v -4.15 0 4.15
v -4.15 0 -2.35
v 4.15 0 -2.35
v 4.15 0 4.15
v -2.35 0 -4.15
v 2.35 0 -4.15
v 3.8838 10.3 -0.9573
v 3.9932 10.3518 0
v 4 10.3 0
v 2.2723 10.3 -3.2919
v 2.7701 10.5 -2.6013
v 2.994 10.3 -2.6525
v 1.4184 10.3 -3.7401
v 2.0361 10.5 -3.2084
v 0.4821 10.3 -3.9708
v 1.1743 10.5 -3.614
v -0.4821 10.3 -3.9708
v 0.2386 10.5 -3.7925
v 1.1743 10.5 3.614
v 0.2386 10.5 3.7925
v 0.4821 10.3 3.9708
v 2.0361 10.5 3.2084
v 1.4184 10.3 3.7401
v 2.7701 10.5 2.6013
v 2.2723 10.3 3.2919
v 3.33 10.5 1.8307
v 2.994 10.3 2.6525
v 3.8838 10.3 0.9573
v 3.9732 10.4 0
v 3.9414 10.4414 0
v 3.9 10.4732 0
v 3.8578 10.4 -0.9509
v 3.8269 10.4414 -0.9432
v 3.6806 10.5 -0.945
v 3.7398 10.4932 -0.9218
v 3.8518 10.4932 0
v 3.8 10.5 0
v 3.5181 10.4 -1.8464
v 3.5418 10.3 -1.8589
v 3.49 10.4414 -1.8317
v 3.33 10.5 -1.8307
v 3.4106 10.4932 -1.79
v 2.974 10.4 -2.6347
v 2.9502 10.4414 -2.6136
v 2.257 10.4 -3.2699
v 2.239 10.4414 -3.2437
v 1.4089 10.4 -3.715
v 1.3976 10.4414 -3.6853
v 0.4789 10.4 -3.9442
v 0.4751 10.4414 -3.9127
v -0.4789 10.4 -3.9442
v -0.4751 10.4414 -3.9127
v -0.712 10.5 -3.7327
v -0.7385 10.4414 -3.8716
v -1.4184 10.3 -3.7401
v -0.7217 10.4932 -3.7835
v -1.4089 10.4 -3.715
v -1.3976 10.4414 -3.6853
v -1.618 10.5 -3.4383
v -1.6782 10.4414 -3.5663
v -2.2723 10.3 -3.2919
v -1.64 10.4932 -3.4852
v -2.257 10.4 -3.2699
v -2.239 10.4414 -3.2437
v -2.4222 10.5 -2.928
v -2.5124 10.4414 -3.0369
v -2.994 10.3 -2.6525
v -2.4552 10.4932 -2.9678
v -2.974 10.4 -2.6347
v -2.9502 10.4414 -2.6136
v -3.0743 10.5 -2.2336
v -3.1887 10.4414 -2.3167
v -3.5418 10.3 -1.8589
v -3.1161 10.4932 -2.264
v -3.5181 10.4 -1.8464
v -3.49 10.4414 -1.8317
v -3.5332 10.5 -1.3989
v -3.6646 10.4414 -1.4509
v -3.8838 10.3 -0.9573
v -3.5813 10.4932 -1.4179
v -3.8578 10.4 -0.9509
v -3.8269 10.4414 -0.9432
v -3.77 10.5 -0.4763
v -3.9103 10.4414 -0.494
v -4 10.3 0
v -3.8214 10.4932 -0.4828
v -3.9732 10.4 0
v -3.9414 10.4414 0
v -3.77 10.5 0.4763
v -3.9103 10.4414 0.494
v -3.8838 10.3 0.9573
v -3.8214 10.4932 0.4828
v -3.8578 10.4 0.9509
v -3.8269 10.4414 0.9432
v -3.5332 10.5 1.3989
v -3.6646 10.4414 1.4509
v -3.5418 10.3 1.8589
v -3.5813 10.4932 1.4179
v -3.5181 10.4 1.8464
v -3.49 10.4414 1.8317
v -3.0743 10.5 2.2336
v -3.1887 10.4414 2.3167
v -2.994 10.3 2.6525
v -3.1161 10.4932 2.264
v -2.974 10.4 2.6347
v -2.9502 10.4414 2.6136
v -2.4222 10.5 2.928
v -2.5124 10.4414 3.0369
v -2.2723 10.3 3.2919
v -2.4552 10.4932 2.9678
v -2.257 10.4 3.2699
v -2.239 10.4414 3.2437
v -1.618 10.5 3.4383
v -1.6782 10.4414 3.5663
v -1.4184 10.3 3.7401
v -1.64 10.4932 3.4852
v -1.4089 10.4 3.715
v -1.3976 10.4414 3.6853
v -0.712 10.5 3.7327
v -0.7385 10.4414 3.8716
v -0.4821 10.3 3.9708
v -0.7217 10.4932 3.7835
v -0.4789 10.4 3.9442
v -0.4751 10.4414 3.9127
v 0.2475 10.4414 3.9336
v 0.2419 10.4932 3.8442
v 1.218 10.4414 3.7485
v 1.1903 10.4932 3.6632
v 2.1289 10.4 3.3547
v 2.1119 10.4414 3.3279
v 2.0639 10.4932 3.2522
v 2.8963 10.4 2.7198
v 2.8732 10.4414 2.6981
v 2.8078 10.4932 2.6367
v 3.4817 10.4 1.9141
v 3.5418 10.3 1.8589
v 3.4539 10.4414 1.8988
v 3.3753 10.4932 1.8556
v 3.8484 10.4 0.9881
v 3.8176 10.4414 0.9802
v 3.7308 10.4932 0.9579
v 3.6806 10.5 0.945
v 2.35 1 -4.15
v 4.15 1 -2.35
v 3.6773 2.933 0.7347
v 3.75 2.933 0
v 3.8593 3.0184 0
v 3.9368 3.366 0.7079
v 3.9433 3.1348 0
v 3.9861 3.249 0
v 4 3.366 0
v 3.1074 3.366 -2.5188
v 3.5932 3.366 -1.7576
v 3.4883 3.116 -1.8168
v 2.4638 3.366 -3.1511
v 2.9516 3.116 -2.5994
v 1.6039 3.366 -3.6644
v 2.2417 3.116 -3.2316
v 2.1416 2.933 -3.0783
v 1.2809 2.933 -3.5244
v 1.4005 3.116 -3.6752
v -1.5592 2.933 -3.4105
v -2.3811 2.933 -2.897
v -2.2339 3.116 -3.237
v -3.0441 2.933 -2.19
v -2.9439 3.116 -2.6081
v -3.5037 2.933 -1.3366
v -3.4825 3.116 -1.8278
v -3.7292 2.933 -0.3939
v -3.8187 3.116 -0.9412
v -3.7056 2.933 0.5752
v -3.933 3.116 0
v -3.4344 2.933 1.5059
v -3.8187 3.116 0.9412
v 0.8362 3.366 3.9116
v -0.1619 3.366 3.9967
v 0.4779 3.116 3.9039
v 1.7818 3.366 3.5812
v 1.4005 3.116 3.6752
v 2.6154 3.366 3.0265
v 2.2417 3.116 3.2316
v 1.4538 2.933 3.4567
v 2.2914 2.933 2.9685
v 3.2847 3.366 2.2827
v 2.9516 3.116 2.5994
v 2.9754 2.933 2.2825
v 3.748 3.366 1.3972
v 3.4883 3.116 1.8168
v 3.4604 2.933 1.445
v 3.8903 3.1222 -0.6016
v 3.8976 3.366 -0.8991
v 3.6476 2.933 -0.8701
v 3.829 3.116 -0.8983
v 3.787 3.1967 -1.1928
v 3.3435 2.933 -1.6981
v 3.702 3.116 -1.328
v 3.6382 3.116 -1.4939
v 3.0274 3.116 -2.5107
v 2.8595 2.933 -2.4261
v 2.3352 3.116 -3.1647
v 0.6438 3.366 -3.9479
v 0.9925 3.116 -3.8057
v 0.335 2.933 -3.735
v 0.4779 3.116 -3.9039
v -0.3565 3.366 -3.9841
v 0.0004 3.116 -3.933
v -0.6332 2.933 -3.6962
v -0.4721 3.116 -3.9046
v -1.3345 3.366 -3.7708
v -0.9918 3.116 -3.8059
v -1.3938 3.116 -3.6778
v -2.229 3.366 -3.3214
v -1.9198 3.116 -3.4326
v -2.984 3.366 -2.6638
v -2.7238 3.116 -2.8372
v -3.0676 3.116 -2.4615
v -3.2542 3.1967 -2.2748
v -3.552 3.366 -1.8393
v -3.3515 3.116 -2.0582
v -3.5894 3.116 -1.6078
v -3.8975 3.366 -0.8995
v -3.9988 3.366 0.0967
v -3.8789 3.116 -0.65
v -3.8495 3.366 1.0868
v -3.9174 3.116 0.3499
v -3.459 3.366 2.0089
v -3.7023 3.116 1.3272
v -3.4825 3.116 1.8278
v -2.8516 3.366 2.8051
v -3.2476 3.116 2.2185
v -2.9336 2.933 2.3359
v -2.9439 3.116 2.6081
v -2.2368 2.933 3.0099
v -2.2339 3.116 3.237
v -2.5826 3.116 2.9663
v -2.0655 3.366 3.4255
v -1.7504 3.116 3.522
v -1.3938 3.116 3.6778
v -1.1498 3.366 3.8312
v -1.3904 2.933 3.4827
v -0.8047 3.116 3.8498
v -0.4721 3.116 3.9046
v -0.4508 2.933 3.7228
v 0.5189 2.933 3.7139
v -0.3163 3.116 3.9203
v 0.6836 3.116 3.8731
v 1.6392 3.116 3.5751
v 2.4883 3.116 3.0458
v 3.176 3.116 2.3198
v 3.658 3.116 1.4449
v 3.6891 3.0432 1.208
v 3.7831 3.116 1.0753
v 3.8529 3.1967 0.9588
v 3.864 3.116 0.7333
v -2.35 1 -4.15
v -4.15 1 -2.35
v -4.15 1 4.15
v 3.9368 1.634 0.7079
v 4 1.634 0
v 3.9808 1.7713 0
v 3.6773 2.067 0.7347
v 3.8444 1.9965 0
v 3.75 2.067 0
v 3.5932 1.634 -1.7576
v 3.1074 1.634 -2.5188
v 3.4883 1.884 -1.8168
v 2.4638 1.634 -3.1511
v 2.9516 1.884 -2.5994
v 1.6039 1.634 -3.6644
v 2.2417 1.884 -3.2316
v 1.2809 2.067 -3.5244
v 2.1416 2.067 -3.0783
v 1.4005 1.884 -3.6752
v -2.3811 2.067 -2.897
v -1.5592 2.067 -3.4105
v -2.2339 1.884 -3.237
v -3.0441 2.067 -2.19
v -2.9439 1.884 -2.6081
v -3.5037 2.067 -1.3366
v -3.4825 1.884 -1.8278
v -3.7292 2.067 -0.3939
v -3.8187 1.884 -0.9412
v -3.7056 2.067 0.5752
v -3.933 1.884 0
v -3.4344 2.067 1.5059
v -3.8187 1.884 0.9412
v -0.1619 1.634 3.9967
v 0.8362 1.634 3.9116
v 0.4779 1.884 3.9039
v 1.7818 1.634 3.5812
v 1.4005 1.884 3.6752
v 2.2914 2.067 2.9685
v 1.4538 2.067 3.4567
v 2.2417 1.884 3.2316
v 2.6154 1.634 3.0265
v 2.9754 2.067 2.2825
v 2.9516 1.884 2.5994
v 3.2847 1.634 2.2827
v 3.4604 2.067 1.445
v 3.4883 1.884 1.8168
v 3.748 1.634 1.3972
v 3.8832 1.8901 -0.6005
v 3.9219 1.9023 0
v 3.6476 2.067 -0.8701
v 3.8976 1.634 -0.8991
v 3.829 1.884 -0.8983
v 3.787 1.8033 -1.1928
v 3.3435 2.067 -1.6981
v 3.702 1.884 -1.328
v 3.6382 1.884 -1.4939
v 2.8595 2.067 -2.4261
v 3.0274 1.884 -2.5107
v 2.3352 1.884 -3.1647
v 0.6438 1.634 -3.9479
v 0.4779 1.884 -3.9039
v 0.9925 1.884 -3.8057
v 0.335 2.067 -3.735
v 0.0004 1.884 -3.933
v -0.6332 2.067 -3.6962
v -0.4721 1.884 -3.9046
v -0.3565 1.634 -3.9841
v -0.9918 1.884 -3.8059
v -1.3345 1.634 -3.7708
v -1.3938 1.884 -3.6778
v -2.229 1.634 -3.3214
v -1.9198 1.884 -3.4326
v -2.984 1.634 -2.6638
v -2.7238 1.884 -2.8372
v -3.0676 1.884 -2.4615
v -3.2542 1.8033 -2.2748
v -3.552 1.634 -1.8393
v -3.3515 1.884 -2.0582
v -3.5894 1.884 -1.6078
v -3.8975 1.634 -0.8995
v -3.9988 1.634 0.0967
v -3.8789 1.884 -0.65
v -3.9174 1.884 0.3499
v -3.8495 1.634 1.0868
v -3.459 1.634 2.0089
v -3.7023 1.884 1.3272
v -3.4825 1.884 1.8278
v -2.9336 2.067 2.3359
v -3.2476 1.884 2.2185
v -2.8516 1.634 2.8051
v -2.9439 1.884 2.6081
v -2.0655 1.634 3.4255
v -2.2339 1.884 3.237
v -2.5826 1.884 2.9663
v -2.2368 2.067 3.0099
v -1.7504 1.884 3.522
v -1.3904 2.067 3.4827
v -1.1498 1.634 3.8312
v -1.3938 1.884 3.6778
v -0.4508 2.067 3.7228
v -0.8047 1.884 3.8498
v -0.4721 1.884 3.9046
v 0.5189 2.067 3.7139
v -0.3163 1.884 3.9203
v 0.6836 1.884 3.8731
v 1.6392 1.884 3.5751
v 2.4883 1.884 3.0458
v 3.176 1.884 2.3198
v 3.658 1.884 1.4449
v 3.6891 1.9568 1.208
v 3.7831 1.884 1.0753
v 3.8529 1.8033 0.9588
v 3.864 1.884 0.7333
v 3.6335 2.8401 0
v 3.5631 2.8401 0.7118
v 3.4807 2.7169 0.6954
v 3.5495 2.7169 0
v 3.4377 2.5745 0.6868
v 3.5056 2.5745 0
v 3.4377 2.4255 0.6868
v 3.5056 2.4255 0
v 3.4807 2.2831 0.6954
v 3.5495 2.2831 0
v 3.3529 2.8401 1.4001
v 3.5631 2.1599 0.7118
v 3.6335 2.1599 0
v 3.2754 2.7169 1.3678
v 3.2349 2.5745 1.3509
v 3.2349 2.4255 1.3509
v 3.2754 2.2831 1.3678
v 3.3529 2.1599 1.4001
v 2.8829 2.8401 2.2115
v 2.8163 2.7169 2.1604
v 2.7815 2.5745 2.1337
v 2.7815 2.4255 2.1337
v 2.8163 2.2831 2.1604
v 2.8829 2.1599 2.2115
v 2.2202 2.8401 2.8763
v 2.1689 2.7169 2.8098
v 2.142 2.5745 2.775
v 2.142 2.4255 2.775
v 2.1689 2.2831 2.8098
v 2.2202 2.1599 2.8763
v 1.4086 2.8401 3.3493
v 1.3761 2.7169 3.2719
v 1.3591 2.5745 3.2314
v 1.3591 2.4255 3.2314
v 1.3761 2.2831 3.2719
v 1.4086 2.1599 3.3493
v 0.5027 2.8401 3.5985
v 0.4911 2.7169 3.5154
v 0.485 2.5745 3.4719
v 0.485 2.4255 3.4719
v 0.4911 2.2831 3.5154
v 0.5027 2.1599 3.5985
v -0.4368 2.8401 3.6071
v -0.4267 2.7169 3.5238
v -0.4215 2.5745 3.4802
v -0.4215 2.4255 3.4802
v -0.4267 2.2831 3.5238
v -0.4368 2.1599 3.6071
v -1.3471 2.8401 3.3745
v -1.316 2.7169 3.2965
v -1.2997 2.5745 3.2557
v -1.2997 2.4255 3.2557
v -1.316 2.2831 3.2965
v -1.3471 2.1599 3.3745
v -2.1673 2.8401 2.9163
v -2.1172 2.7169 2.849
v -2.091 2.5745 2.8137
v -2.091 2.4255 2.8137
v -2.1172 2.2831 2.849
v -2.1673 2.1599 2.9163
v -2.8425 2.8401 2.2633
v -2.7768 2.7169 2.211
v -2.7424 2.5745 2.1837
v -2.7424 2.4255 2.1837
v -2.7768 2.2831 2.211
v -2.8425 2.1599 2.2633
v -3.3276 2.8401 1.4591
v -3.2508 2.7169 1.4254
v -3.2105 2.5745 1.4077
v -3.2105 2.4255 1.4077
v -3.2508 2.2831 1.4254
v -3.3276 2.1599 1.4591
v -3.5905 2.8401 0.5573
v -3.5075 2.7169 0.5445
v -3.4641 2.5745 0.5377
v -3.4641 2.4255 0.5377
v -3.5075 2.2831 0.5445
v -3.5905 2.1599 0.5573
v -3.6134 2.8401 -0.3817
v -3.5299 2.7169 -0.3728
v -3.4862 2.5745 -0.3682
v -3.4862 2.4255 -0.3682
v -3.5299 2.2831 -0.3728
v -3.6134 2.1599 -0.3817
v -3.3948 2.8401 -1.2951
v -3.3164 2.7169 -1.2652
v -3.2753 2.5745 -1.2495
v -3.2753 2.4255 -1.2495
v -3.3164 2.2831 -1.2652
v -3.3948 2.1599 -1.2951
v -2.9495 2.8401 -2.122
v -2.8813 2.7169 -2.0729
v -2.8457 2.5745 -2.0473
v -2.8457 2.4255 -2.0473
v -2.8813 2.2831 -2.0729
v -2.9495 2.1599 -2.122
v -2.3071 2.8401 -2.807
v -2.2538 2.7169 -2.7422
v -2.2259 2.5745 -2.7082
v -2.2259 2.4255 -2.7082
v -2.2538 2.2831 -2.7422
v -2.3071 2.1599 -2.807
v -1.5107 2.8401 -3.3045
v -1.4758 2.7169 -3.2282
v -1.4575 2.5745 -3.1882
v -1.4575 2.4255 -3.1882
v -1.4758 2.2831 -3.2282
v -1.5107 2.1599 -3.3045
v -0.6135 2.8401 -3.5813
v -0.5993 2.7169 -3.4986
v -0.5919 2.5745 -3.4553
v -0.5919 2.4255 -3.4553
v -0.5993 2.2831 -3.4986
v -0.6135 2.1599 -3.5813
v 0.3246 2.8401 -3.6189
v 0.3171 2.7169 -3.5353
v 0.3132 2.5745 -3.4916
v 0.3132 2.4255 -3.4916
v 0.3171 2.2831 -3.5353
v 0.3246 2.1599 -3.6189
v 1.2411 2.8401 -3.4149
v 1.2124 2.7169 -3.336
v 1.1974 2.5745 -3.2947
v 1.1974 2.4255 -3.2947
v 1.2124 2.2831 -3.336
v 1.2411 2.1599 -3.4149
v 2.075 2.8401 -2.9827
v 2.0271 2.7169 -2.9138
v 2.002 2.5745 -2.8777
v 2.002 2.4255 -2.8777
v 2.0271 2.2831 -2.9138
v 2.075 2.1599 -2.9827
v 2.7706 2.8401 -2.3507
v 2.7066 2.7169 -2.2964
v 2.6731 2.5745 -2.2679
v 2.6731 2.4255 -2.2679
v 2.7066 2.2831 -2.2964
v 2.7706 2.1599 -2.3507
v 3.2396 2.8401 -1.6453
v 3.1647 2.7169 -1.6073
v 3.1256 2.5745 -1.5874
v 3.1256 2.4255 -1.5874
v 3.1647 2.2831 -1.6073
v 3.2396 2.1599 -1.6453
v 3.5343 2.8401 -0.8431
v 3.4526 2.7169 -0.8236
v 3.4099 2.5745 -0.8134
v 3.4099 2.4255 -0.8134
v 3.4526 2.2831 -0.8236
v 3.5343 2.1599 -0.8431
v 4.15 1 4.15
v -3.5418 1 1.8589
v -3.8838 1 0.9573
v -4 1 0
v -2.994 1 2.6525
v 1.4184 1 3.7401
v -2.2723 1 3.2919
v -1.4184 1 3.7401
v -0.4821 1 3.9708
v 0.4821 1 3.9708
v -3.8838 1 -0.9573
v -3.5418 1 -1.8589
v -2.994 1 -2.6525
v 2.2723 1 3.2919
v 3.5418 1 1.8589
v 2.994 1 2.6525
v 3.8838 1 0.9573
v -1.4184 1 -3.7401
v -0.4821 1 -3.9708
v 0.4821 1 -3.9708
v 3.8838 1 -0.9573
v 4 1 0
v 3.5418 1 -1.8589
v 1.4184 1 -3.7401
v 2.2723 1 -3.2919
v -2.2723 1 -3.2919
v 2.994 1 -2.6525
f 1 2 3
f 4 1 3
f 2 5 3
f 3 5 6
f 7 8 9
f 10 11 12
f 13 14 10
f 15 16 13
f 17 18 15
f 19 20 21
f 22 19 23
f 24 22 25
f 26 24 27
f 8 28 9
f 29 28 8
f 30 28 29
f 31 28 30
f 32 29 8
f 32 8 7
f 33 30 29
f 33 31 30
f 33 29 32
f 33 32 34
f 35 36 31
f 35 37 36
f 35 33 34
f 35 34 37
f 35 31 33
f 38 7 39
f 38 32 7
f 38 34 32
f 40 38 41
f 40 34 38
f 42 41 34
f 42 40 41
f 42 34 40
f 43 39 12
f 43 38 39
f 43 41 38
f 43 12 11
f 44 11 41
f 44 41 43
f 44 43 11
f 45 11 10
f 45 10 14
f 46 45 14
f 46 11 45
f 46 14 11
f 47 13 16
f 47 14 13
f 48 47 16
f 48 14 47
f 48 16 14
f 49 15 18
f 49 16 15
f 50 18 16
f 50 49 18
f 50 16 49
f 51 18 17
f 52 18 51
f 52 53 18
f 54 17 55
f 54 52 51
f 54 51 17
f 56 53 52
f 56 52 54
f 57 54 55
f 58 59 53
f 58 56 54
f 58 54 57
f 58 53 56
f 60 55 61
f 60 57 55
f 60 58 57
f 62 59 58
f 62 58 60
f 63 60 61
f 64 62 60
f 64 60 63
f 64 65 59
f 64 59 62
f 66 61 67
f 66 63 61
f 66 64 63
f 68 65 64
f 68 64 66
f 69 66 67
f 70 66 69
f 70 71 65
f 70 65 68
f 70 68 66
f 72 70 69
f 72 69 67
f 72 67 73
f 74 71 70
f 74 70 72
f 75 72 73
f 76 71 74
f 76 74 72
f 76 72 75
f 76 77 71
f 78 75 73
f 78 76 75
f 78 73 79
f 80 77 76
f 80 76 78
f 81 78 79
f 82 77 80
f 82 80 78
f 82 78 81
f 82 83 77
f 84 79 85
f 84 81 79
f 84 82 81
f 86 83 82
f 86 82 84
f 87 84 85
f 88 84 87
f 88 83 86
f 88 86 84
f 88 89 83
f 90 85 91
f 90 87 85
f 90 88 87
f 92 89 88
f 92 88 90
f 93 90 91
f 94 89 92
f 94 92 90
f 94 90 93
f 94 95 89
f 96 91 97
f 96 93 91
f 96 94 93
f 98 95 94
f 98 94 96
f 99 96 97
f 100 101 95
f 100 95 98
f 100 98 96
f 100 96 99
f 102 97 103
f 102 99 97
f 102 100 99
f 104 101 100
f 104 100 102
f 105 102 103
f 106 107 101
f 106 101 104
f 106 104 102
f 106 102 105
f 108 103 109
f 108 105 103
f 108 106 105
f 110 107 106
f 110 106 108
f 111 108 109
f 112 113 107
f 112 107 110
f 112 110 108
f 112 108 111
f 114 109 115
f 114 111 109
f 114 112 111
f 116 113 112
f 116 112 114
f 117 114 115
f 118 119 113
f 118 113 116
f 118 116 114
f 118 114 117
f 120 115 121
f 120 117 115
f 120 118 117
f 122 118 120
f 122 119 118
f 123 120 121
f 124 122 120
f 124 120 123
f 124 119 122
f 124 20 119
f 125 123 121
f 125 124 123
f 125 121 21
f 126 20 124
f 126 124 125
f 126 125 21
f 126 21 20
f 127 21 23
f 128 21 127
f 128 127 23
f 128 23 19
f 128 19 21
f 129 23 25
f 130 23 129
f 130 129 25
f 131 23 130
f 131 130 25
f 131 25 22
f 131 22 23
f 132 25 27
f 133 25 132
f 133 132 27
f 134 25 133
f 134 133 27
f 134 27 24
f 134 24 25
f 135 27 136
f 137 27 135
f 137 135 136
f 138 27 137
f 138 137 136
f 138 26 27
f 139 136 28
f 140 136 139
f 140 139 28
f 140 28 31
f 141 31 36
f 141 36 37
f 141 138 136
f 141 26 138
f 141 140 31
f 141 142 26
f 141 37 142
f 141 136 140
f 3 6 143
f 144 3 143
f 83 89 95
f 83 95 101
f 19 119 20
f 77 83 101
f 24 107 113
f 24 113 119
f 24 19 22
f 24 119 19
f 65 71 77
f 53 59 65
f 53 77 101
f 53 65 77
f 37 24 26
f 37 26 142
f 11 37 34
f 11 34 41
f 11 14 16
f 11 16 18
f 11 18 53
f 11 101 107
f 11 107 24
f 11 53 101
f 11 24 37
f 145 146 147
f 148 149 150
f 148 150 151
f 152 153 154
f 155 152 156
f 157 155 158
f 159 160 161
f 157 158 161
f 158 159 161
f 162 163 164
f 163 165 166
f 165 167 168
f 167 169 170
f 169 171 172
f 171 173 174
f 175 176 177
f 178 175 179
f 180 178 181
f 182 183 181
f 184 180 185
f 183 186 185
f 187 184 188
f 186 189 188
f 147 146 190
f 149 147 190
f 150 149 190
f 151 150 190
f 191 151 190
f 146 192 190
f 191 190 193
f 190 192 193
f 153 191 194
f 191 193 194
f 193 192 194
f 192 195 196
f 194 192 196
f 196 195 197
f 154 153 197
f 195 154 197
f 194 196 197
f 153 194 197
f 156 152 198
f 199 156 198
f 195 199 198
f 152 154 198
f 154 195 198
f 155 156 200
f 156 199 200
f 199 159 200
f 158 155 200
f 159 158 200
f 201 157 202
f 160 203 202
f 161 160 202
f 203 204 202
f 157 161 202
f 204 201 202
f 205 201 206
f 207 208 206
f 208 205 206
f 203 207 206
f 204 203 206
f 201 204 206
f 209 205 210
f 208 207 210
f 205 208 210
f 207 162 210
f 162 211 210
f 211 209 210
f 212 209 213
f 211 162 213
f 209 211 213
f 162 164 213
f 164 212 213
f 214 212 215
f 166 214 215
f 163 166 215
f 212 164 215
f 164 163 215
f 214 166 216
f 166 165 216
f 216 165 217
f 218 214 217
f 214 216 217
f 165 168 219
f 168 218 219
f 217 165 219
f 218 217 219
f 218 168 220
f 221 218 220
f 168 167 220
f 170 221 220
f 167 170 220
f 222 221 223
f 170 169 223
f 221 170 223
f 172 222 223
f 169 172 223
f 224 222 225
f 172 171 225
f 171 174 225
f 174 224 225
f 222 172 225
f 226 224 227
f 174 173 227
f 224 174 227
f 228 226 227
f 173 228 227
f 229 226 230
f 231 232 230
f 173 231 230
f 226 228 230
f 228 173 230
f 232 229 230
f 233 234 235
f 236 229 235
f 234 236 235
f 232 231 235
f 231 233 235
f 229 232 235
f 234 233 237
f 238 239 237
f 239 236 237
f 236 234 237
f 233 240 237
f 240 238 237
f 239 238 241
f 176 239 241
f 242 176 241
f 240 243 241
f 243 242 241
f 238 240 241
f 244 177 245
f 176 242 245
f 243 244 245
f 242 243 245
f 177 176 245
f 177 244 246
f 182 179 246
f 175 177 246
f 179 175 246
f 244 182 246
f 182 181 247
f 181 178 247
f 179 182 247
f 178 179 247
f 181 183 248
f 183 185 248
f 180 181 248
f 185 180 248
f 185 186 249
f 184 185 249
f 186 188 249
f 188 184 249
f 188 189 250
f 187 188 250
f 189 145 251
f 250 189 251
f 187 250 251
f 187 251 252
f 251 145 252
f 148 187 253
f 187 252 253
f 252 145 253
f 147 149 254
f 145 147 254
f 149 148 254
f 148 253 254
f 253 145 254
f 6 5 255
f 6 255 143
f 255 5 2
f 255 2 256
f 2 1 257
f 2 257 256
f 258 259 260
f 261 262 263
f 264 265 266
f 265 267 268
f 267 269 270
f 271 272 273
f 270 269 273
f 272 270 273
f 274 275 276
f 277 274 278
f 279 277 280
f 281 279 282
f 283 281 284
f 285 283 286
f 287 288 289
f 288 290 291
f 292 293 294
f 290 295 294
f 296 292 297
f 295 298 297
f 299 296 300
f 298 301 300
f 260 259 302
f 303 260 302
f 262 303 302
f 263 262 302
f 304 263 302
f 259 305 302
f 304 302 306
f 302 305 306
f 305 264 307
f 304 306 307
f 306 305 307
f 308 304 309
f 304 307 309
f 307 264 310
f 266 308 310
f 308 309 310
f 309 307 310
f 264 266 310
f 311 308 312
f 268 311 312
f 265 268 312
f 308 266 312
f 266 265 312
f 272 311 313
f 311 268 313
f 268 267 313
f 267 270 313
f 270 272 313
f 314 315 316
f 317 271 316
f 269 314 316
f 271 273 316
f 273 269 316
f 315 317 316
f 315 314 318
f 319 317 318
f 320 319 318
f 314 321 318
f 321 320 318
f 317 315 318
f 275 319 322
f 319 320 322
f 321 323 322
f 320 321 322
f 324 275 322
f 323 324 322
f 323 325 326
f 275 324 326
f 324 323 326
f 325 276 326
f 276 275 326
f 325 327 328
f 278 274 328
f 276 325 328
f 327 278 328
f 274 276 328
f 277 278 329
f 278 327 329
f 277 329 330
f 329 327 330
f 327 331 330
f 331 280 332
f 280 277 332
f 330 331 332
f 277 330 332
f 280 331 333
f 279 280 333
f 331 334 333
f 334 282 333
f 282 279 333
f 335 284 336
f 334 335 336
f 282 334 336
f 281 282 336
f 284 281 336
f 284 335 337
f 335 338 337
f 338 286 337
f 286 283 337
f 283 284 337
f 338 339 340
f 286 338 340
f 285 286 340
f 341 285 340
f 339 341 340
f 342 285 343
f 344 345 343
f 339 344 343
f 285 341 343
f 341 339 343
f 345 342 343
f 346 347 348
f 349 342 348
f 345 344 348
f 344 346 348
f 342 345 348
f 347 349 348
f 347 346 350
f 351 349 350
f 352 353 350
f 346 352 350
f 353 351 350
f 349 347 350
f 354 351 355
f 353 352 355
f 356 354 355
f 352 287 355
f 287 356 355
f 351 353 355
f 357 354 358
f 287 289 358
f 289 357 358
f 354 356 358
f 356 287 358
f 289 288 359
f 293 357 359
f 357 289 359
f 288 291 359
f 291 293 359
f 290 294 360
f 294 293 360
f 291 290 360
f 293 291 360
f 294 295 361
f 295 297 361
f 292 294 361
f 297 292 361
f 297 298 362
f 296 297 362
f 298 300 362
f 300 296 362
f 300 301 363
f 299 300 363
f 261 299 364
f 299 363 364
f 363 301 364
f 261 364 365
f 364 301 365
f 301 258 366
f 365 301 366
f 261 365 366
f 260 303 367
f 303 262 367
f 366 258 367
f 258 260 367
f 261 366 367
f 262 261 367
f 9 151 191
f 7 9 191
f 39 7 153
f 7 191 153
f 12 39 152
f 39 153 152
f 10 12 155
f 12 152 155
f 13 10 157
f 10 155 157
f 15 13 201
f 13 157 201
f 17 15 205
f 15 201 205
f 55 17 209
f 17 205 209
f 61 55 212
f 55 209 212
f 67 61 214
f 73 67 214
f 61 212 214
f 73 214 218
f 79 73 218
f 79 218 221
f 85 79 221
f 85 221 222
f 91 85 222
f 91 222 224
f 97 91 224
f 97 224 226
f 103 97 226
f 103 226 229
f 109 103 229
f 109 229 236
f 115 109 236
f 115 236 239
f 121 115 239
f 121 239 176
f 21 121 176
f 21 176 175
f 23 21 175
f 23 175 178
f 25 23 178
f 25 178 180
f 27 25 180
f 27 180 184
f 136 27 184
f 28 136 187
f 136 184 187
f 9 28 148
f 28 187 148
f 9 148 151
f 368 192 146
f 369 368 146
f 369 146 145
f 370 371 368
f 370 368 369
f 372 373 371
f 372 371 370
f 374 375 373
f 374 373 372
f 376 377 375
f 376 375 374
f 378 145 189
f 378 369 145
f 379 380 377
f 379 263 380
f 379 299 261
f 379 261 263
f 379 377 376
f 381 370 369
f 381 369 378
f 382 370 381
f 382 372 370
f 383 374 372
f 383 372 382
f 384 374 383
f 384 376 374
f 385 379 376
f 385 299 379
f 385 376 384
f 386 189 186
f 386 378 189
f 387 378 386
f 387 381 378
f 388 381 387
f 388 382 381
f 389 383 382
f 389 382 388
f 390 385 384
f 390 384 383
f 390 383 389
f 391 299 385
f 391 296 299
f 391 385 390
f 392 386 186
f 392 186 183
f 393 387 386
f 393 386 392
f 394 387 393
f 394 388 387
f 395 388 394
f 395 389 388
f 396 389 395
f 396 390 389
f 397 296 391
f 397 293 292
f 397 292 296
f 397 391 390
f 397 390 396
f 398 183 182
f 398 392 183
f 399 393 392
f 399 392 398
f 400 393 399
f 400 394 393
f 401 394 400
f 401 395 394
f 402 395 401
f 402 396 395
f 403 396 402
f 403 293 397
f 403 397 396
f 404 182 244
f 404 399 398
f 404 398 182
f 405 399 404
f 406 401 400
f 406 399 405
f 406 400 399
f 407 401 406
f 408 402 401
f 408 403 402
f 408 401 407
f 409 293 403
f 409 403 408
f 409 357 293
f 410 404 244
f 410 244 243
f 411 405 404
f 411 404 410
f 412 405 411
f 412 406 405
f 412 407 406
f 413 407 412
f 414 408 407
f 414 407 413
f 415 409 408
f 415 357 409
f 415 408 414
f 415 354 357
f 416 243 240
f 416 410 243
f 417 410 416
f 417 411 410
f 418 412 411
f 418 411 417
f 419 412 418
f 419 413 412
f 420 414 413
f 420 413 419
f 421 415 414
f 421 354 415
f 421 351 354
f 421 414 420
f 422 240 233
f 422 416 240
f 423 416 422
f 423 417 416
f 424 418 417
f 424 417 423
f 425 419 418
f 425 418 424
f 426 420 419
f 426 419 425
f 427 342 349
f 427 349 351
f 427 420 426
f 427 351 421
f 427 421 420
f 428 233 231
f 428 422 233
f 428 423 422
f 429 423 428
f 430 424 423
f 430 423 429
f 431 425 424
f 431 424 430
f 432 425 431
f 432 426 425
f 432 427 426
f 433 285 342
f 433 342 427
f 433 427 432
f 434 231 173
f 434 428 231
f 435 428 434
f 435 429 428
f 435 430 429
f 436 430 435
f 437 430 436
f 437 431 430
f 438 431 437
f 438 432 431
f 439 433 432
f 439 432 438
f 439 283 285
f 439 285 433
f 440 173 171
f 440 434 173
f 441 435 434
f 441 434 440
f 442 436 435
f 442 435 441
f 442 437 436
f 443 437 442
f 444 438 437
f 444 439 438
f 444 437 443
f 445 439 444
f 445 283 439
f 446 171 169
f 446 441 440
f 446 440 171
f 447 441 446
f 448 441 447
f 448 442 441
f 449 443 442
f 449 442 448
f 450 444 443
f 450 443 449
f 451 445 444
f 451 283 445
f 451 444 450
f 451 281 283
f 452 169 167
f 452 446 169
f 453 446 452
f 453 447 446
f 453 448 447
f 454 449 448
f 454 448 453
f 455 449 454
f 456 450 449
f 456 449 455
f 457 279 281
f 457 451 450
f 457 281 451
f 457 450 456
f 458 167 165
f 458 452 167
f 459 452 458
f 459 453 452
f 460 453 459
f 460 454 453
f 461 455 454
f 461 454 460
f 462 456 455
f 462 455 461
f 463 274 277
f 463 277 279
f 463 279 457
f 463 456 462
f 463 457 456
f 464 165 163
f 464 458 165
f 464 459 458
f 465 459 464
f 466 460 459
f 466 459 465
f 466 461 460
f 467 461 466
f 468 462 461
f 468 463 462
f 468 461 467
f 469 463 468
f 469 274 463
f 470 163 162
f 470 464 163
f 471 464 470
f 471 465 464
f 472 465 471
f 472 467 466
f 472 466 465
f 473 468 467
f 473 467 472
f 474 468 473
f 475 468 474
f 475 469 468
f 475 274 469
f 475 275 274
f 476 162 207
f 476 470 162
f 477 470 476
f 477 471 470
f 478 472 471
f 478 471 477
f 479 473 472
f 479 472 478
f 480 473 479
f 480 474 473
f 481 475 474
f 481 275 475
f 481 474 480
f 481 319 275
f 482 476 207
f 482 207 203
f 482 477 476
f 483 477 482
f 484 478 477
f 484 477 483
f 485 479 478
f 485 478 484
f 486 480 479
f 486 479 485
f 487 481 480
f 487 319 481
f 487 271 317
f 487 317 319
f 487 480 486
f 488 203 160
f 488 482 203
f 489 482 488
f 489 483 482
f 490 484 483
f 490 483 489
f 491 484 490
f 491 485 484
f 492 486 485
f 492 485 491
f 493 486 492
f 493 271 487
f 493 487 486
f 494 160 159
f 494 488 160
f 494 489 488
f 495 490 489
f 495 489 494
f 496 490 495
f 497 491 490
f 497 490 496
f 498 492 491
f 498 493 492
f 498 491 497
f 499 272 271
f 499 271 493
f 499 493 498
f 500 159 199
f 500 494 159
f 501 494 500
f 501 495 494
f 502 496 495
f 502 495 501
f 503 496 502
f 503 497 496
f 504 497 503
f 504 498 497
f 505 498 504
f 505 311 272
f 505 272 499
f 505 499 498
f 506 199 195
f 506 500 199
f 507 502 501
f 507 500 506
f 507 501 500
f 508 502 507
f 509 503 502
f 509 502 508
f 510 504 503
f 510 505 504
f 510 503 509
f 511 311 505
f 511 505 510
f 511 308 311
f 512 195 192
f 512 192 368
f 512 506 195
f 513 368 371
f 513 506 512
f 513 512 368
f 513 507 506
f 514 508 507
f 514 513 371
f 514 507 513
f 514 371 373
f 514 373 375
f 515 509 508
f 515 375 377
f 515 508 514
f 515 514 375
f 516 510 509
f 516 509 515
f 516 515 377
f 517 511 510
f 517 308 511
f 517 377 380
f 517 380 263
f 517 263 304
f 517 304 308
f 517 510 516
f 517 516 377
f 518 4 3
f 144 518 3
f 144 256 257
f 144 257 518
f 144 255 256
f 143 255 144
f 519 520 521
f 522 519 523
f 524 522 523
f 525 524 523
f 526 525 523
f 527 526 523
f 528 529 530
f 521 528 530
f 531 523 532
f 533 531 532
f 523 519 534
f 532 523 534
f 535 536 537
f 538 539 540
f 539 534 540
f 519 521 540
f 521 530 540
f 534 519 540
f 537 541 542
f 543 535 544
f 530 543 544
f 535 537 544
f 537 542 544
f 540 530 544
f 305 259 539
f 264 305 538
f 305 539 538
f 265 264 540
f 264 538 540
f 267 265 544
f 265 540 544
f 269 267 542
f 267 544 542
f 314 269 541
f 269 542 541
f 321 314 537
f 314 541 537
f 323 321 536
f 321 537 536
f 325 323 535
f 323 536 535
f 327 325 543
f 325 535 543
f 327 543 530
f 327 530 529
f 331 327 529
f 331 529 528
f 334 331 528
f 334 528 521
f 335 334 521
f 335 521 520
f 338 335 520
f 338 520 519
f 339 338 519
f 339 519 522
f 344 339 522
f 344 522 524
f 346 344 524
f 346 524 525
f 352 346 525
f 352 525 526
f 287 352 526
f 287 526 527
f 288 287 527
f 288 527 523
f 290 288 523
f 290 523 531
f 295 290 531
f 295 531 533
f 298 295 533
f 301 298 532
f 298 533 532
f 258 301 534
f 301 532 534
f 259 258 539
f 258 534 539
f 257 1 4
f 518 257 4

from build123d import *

# Parameters (mm, degrees)
SKETCH1_W           = 8.3
SKETCH1_H           = 8.3
BOSS_EXTRUDE1_DEPTH = 1
SKETCH2_R           = 4
BOSS_EXTRUDE2_DEPTH = 9.5
SKETCH3_R           = 0.5
FILLET1_R           = 0.5
FILLET2_R           = 0.2
CHAMFER1_SIZE       = 1.8


with BuildPart() as part:
    # Sketch1 → Boss-Extrude1 (new body)
    with BuildSketch(Plane(origin=(0, 0, 0), x_dir=(1, 0, 0), z_dir=(0, 1, 0))):
        Rectangle(SKETCH1_W, SKETCH1_H)
    extrude(amount=BOSS_EXTRUDE1_DEPTH)

    # Chamfer1
    chamfer1_edges = [part.edges().sort_by_distance(p)[0] for p in [
        (-4.15, 0.5, -4.15),
        (4.15, 0.5, -4.15),
    ]]
    chamfer(chamfer1_edges, length=CHAMFER1_SIZE)


with BuildPart() as body_2:
    # Sketch2 → Boss-Extrude2 (new body)
    with BuildSketch(Plane(origin=(0, 1, 0), x_dir=(1, 0, 0), z_dir=(0, 1, 0))):
        Circle(SKETCH2_R)
    extrude(amount=BOSS_EXTRUDE2_DEPTH)

    # Sketch3 → Cut-Revolve1 (revolve, cut)
    with BuildSketch(Plane.XY):
        with Locations((4, 2.5)):
            Circle(SKETCH3_R)
    revolve(axis=Axis((0, 10.5, 0), (0, -1, 0)), mode=Mode.SUBTRACT)

    # Fillet1
    fillet1_edges = [body_2.edges().sort_by_distance(p)[0] for p in [
        (-4, 3, 0),
        (-4, 2, 0),
    ]]
    fillet(fillet1_edges, radius=FILLET1_R)

    # Fillet2
    fillet2_edges = [body_2.edges().sort_by_distance(p)[0] for p in [
        (-4, 10.5, 0),
    ]]
    fillet(fillet2_edges, radius=FILLET2_R)


solid = Compound([part.part, body_2.part])
